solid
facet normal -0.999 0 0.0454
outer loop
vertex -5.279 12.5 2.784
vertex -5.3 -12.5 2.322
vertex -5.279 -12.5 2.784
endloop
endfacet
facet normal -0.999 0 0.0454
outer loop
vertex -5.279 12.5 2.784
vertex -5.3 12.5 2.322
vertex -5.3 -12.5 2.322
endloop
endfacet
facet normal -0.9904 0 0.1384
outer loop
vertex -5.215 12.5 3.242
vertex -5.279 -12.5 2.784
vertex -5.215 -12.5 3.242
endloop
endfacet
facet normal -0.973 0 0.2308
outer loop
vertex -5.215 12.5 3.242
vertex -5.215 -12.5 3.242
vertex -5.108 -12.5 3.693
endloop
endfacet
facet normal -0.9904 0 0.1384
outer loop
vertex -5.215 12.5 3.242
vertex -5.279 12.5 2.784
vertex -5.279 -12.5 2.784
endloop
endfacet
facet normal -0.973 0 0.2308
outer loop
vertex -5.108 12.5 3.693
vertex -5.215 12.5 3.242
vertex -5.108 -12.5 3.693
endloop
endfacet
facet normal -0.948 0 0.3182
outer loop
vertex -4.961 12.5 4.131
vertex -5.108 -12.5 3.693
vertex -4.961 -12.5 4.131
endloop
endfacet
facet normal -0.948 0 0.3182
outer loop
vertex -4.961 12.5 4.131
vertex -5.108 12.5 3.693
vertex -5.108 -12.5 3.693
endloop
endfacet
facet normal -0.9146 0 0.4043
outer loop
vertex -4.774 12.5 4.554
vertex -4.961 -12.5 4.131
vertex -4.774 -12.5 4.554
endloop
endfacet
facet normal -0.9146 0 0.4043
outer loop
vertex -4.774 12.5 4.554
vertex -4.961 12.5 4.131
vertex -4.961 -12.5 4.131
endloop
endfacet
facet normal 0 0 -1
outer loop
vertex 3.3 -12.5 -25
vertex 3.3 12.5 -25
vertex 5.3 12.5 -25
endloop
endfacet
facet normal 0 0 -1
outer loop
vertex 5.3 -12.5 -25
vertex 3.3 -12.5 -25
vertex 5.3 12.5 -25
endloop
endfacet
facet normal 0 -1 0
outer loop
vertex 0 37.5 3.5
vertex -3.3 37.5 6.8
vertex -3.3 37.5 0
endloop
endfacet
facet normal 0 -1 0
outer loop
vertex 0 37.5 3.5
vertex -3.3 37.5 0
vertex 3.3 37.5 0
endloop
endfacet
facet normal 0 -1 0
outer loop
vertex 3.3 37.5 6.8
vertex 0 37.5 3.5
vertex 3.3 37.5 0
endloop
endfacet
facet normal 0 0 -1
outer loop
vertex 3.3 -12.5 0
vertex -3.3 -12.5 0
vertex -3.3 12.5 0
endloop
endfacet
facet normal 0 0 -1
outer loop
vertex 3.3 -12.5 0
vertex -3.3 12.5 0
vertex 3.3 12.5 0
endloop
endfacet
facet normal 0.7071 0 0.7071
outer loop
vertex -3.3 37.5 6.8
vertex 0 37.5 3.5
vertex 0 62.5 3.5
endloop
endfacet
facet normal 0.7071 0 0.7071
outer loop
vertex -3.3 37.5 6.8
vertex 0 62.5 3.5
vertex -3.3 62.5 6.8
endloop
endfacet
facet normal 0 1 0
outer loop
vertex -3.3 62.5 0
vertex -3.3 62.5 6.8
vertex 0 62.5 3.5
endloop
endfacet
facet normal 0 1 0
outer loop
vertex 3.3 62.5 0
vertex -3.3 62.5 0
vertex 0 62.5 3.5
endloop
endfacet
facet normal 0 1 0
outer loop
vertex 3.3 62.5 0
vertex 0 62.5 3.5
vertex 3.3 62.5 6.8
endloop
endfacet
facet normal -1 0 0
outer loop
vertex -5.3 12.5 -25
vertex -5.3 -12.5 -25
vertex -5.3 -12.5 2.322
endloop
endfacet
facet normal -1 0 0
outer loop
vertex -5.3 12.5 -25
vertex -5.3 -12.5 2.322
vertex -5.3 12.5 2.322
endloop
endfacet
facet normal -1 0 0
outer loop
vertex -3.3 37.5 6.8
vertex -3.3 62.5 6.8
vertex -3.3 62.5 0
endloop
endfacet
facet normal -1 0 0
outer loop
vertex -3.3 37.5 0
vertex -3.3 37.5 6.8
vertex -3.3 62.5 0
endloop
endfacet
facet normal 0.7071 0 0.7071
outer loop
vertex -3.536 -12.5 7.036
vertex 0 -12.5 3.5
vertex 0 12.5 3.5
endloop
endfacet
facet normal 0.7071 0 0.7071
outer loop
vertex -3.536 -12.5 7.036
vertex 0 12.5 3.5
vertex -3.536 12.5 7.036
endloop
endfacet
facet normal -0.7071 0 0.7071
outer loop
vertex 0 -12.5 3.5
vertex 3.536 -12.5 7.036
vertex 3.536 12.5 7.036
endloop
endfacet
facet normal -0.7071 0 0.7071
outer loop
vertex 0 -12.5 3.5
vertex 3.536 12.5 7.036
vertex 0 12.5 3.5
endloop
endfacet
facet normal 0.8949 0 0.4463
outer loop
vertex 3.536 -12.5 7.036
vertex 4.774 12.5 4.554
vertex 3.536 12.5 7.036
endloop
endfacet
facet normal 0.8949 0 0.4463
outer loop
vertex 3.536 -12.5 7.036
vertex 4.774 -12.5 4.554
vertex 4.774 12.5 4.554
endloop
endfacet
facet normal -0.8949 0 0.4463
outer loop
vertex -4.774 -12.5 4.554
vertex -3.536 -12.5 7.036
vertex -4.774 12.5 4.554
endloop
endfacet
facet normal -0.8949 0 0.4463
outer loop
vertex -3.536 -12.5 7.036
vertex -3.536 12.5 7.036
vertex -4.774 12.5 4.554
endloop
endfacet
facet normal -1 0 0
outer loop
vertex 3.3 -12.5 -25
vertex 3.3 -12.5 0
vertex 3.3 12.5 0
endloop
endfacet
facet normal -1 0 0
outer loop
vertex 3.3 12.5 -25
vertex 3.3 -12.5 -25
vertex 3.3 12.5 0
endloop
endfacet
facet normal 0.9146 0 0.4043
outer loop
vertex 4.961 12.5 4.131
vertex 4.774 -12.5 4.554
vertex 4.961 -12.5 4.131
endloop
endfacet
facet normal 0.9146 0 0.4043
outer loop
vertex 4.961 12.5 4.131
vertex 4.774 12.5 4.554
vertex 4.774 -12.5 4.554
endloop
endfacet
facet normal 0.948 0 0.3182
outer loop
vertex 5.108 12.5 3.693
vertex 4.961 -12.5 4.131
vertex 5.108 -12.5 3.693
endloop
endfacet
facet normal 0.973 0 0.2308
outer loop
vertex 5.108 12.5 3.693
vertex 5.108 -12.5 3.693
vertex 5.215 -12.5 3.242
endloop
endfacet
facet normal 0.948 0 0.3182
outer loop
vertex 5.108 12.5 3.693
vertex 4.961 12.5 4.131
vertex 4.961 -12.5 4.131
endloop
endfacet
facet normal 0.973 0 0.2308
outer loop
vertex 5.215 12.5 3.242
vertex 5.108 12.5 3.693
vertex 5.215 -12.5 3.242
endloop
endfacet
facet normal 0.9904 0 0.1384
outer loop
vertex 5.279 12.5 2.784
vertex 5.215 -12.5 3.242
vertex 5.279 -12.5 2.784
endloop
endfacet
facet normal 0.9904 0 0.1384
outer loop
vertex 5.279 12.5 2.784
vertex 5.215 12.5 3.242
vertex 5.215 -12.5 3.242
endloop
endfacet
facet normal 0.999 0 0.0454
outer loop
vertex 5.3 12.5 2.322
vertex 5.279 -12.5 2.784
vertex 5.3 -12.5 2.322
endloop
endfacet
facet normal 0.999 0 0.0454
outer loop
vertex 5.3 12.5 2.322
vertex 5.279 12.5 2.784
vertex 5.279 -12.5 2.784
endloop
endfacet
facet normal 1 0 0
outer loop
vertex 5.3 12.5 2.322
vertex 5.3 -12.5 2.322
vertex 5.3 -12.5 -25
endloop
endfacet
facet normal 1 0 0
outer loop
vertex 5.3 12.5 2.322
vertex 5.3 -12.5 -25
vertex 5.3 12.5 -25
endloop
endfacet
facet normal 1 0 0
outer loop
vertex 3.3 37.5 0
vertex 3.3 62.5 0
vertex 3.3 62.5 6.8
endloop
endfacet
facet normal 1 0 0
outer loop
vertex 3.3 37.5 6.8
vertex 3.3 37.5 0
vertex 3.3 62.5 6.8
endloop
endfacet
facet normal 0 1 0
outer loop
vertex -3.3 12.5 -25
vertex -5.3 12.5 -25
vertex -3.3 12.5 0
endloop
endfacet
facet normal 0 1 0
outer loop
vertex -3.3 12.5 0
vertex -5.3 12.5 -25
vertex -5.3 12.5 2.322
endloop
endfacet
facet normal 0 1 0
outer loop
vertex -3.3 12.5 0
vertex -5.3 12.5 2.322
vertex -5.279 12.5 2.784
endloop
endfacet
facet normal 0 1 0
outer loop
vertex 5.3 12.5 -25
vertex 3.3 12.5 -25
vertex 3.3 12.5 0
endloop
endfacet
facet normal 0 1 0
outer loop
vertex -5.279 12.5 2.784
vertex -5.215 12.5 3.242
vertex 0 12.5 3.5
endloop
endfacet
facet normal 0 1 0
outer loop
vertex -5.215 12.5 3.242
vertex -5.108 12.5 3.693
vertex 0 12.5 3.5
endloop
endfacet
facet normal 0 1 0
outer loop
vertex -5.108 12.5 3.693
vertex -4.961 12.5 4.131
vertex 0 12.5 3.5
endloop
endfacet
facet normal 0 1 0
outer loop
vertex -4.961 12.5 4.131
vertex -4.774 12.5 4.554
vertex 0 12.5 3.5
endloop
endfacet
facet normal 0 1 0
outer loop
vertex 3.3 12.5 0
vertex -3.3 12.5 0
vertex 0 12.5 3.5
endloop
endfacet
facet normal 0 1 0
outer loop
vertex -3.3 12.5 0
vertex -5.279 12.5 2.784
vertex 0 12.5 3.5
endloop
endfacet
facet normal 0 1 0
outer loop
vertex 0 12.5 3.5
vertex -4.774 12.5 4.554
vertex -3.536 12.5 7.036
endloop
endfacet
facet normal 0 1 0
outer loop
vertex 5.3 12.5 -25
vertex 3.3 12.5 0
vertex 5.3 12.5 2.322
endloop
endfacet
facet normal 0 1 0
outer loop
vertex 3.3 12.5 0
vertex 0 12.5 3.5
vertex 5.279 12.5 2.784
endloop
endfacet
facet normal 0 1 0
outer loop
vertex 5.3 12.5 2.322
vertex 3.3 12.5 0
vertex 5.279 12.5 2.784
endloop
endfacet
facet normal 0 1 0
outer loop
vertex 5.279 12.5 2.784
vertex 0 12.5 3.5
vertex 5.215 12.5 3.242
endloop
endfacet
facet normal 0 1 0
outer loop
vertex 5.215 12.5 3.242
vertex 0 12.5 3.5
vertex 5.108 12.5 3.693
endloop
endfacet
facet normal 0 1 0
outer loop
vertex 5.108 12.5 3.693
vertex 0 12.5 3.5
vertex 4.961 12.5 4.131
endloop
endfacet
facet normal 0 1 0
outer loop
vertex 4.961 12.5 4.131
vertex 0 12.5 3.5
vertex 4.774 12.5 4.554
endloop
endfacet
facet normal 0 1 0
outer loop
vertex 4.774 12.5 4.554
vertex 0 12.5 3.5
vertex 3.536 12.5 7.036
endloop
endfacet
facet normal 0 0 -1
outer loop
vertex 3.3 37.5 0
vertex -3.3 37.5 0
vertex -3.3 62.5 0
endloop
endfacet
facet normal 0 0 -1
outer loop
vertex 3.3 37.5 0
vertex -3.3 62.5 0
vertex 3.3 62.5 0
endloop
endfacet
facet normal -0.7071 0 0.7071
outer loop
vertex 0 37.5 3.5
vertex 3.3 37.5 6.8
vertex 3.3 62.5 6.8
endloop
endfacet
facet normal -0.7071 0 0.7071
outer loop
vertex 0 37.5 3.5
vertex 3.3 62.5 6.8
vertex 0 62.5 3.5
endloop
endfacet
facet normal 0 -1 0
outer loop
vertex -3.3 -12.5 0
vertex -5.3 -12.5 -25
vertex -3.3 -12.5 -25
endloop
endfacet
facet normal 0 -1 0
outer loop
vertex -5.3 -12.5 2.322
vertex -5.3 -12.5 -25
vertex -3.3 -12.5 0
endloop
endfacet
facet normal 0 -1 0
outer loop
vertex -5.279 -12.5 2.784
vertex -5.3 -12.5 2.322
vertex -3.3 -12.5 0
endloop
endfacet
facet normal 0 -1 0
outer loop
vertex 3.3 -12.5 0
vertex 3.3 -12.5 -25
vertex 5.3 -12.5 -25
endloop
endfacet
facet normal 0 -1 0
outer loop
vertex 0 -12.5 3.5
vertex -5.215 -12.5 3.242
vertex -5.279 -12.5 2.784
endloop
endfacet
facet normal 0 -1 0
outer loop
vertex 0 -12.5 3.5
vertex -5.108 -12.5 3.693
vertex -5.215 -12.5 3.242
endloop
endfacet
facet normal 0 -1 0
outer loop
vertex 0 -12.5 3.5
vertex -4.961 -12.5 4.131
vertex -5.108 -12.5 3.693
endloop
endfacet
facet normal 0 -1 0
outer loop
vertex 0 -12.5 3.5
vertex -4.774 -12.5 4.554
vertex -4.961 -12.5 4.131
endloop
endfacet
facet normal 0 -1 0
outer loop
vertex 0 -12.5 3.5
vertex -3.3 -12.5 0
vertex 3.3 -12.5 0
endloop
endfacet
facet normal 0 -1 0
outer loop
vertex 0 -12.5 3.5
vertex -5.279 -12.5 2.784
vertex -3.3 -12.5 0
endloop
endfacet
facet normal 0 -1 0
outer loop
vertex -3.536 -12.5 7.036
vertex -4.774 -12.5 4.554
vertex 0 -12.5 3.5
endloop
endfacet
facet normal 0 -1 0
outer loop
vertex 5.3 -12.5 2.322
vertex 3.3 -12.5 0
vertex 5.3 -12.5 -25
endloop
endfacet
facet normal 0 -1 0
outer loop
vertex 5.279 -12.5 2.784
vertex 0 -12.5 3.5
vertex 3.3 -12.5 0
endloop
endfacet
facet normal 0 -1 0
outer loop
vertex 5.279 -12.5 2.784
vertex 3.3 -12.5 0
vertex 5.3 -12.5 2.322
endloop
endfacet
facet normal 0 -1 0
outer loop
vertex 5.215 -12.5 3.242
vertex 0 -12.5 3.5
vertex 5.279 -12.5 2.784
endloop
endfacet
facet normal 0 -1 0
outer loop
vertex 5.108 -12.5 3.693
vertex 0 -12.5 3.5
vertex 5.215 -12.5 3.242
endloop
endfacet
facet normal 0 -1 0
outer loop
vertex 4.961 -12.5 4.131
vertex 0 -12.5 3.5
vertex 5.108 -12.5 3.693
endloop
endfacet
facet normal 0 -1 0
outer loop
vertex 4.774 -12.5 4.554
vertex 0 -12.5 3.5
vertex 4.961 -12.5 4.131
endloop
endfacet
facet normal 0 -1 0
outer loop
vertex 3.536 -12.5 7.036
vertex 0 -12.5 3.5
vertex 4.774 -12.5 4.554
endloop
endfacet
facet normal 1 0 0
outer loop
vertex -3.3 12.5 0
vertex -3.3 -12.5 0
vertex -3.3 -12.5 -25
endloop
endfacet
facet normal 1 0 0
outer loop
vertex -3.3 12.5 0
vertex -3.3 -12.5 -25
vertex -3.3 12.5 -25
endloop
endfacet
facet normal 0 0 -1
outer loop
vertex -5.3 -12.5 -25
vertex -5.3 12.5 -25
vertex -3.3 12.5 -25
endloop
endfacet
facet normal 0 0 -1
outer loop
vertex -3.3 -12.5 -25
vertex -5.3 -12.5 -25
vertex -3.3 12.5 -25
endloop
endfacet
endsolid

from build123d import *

# Parameters (mm, degrees)
F0_W          = 2
F0_H          = 25
F0_W_2        = 6.6
F1_DEPTH      = 3.5
F2_DEPTH      = 25
F4_DEPTH      = 12.5
F4_DEPTH_BACK = 12.5
F5_R          = 5
F7_W          = 25
F7_H          = 20
F8_DEPTH      = 25
F10_DEPTH     = 27.2


with BuildPart() as f1:
    # F0 (on Top) → F1 (new body)
    with BuildSketch(Plane.XY):
        with Locations((-4.3, 0)):
            Rectangle(F0_W, F0_H)
        Rectangle(F0_W_2, F0_H)
        with Locations((4.3, 0)):
            Rectangle(F0_W, F0_H)
    extrude(amount=F1_DEPTH)

    # F0 (on Top) → F2 (join)
    with BuildSketch(Plane.XY):
        with Locations((-4.3, 0)):
            Rectangle(F0_W, F0_H)
        with Locations((4.3, 0)):
            Rectangle(F0_W, F0_H)
    extrude(amount=-F2_DEPTH)

    # F3 (on Front) → F4 (join, two sides)
    with BuildSketch(Plane.XZ) as f4_sk:
        Polygon((0, 3.5), (5.3, 3.5), (3.5355339059, 7.0355339059), align=None)
        Polygon((-5.3, 3.5), (0, 3.5), (-3.5355339059, 7.0355339059), align=None)
    extrude(amount=F4_DEPTH)
    extrude(f4_sk.sketch, amount=-F4_DEPTH_BACK)

    # F5
    f5_edges = [f1.edges().sort_by_distance(p)[0] for p in [
        (-5.3, 0, 3.5),
        (5.3, 0, 3.5),
    ]]
    fillet(f5_edges, radius=F5_R)


with BuildPart() as f6_1:
    # F6: copy of F1
    add(f1.part.moved(Location((0, 50, 0))))

    # F7 (on face) → F8 (cut)
    with BuildSketch(Plane.YZ.offset(5.3)):
        with Locations((50, -15)):
            Rectangle(F7_W, F7_H)
    extrude(amount=-F8_DEPTH, mode=Mode.SUBTRACT)

    # F9 (on face) → F10 (cut)
    with BuildSketch(Plane(origin=(0, 62.5, 0), x_dir=(-1, 0, 0), z_dir=(0, 1, 0))):
        with BuildLine():
            Line((-5.3, 2.3216319807), (-5.3, -5))
            Line((-5.3, -5), (-3.3, -5))
            Line((-3.3, -5), (-3.3, 0))
            Line((-3.3, 0), (-3.3, 6.8))
            Line((-3.3, 6.8), (-3.5355339059, 7.0355339059))
            Line((-3.5355339059, 7.0355339059), (-4.7738054473, 4.5543578527))
            ThreePointArc((-4.7738054473, 4.5543578527), (-5.1666737736, 3.4685785277), (-5.3, 2.3216319807))
        make_face()
        with BuildLine():
            Line((3.3, 6.8), (3.3, 0))
            Line((3.3, 0), (3.3, -5))
            Line((3.3, -5), (5.3, -5))
            Line((5.3, -5), (5.3, 2.3216319807))
            ThreePointArc((5.3, 2.3216319807), (5.1666737736, 3.4685785277), (4.7738054473, 4.5543578527))
            Line((4.7738054473, 4.5543578527), (3.5355339059, 7.0355339059))
            Line((3.5355339059, 7.0355339059), (3.3, 6.8))
        make_face()
    extrude(amount=-F10_DEPTH, mode=Mode.SUBTRACT)


solid = Compound([f1.part, f6_1.part])
